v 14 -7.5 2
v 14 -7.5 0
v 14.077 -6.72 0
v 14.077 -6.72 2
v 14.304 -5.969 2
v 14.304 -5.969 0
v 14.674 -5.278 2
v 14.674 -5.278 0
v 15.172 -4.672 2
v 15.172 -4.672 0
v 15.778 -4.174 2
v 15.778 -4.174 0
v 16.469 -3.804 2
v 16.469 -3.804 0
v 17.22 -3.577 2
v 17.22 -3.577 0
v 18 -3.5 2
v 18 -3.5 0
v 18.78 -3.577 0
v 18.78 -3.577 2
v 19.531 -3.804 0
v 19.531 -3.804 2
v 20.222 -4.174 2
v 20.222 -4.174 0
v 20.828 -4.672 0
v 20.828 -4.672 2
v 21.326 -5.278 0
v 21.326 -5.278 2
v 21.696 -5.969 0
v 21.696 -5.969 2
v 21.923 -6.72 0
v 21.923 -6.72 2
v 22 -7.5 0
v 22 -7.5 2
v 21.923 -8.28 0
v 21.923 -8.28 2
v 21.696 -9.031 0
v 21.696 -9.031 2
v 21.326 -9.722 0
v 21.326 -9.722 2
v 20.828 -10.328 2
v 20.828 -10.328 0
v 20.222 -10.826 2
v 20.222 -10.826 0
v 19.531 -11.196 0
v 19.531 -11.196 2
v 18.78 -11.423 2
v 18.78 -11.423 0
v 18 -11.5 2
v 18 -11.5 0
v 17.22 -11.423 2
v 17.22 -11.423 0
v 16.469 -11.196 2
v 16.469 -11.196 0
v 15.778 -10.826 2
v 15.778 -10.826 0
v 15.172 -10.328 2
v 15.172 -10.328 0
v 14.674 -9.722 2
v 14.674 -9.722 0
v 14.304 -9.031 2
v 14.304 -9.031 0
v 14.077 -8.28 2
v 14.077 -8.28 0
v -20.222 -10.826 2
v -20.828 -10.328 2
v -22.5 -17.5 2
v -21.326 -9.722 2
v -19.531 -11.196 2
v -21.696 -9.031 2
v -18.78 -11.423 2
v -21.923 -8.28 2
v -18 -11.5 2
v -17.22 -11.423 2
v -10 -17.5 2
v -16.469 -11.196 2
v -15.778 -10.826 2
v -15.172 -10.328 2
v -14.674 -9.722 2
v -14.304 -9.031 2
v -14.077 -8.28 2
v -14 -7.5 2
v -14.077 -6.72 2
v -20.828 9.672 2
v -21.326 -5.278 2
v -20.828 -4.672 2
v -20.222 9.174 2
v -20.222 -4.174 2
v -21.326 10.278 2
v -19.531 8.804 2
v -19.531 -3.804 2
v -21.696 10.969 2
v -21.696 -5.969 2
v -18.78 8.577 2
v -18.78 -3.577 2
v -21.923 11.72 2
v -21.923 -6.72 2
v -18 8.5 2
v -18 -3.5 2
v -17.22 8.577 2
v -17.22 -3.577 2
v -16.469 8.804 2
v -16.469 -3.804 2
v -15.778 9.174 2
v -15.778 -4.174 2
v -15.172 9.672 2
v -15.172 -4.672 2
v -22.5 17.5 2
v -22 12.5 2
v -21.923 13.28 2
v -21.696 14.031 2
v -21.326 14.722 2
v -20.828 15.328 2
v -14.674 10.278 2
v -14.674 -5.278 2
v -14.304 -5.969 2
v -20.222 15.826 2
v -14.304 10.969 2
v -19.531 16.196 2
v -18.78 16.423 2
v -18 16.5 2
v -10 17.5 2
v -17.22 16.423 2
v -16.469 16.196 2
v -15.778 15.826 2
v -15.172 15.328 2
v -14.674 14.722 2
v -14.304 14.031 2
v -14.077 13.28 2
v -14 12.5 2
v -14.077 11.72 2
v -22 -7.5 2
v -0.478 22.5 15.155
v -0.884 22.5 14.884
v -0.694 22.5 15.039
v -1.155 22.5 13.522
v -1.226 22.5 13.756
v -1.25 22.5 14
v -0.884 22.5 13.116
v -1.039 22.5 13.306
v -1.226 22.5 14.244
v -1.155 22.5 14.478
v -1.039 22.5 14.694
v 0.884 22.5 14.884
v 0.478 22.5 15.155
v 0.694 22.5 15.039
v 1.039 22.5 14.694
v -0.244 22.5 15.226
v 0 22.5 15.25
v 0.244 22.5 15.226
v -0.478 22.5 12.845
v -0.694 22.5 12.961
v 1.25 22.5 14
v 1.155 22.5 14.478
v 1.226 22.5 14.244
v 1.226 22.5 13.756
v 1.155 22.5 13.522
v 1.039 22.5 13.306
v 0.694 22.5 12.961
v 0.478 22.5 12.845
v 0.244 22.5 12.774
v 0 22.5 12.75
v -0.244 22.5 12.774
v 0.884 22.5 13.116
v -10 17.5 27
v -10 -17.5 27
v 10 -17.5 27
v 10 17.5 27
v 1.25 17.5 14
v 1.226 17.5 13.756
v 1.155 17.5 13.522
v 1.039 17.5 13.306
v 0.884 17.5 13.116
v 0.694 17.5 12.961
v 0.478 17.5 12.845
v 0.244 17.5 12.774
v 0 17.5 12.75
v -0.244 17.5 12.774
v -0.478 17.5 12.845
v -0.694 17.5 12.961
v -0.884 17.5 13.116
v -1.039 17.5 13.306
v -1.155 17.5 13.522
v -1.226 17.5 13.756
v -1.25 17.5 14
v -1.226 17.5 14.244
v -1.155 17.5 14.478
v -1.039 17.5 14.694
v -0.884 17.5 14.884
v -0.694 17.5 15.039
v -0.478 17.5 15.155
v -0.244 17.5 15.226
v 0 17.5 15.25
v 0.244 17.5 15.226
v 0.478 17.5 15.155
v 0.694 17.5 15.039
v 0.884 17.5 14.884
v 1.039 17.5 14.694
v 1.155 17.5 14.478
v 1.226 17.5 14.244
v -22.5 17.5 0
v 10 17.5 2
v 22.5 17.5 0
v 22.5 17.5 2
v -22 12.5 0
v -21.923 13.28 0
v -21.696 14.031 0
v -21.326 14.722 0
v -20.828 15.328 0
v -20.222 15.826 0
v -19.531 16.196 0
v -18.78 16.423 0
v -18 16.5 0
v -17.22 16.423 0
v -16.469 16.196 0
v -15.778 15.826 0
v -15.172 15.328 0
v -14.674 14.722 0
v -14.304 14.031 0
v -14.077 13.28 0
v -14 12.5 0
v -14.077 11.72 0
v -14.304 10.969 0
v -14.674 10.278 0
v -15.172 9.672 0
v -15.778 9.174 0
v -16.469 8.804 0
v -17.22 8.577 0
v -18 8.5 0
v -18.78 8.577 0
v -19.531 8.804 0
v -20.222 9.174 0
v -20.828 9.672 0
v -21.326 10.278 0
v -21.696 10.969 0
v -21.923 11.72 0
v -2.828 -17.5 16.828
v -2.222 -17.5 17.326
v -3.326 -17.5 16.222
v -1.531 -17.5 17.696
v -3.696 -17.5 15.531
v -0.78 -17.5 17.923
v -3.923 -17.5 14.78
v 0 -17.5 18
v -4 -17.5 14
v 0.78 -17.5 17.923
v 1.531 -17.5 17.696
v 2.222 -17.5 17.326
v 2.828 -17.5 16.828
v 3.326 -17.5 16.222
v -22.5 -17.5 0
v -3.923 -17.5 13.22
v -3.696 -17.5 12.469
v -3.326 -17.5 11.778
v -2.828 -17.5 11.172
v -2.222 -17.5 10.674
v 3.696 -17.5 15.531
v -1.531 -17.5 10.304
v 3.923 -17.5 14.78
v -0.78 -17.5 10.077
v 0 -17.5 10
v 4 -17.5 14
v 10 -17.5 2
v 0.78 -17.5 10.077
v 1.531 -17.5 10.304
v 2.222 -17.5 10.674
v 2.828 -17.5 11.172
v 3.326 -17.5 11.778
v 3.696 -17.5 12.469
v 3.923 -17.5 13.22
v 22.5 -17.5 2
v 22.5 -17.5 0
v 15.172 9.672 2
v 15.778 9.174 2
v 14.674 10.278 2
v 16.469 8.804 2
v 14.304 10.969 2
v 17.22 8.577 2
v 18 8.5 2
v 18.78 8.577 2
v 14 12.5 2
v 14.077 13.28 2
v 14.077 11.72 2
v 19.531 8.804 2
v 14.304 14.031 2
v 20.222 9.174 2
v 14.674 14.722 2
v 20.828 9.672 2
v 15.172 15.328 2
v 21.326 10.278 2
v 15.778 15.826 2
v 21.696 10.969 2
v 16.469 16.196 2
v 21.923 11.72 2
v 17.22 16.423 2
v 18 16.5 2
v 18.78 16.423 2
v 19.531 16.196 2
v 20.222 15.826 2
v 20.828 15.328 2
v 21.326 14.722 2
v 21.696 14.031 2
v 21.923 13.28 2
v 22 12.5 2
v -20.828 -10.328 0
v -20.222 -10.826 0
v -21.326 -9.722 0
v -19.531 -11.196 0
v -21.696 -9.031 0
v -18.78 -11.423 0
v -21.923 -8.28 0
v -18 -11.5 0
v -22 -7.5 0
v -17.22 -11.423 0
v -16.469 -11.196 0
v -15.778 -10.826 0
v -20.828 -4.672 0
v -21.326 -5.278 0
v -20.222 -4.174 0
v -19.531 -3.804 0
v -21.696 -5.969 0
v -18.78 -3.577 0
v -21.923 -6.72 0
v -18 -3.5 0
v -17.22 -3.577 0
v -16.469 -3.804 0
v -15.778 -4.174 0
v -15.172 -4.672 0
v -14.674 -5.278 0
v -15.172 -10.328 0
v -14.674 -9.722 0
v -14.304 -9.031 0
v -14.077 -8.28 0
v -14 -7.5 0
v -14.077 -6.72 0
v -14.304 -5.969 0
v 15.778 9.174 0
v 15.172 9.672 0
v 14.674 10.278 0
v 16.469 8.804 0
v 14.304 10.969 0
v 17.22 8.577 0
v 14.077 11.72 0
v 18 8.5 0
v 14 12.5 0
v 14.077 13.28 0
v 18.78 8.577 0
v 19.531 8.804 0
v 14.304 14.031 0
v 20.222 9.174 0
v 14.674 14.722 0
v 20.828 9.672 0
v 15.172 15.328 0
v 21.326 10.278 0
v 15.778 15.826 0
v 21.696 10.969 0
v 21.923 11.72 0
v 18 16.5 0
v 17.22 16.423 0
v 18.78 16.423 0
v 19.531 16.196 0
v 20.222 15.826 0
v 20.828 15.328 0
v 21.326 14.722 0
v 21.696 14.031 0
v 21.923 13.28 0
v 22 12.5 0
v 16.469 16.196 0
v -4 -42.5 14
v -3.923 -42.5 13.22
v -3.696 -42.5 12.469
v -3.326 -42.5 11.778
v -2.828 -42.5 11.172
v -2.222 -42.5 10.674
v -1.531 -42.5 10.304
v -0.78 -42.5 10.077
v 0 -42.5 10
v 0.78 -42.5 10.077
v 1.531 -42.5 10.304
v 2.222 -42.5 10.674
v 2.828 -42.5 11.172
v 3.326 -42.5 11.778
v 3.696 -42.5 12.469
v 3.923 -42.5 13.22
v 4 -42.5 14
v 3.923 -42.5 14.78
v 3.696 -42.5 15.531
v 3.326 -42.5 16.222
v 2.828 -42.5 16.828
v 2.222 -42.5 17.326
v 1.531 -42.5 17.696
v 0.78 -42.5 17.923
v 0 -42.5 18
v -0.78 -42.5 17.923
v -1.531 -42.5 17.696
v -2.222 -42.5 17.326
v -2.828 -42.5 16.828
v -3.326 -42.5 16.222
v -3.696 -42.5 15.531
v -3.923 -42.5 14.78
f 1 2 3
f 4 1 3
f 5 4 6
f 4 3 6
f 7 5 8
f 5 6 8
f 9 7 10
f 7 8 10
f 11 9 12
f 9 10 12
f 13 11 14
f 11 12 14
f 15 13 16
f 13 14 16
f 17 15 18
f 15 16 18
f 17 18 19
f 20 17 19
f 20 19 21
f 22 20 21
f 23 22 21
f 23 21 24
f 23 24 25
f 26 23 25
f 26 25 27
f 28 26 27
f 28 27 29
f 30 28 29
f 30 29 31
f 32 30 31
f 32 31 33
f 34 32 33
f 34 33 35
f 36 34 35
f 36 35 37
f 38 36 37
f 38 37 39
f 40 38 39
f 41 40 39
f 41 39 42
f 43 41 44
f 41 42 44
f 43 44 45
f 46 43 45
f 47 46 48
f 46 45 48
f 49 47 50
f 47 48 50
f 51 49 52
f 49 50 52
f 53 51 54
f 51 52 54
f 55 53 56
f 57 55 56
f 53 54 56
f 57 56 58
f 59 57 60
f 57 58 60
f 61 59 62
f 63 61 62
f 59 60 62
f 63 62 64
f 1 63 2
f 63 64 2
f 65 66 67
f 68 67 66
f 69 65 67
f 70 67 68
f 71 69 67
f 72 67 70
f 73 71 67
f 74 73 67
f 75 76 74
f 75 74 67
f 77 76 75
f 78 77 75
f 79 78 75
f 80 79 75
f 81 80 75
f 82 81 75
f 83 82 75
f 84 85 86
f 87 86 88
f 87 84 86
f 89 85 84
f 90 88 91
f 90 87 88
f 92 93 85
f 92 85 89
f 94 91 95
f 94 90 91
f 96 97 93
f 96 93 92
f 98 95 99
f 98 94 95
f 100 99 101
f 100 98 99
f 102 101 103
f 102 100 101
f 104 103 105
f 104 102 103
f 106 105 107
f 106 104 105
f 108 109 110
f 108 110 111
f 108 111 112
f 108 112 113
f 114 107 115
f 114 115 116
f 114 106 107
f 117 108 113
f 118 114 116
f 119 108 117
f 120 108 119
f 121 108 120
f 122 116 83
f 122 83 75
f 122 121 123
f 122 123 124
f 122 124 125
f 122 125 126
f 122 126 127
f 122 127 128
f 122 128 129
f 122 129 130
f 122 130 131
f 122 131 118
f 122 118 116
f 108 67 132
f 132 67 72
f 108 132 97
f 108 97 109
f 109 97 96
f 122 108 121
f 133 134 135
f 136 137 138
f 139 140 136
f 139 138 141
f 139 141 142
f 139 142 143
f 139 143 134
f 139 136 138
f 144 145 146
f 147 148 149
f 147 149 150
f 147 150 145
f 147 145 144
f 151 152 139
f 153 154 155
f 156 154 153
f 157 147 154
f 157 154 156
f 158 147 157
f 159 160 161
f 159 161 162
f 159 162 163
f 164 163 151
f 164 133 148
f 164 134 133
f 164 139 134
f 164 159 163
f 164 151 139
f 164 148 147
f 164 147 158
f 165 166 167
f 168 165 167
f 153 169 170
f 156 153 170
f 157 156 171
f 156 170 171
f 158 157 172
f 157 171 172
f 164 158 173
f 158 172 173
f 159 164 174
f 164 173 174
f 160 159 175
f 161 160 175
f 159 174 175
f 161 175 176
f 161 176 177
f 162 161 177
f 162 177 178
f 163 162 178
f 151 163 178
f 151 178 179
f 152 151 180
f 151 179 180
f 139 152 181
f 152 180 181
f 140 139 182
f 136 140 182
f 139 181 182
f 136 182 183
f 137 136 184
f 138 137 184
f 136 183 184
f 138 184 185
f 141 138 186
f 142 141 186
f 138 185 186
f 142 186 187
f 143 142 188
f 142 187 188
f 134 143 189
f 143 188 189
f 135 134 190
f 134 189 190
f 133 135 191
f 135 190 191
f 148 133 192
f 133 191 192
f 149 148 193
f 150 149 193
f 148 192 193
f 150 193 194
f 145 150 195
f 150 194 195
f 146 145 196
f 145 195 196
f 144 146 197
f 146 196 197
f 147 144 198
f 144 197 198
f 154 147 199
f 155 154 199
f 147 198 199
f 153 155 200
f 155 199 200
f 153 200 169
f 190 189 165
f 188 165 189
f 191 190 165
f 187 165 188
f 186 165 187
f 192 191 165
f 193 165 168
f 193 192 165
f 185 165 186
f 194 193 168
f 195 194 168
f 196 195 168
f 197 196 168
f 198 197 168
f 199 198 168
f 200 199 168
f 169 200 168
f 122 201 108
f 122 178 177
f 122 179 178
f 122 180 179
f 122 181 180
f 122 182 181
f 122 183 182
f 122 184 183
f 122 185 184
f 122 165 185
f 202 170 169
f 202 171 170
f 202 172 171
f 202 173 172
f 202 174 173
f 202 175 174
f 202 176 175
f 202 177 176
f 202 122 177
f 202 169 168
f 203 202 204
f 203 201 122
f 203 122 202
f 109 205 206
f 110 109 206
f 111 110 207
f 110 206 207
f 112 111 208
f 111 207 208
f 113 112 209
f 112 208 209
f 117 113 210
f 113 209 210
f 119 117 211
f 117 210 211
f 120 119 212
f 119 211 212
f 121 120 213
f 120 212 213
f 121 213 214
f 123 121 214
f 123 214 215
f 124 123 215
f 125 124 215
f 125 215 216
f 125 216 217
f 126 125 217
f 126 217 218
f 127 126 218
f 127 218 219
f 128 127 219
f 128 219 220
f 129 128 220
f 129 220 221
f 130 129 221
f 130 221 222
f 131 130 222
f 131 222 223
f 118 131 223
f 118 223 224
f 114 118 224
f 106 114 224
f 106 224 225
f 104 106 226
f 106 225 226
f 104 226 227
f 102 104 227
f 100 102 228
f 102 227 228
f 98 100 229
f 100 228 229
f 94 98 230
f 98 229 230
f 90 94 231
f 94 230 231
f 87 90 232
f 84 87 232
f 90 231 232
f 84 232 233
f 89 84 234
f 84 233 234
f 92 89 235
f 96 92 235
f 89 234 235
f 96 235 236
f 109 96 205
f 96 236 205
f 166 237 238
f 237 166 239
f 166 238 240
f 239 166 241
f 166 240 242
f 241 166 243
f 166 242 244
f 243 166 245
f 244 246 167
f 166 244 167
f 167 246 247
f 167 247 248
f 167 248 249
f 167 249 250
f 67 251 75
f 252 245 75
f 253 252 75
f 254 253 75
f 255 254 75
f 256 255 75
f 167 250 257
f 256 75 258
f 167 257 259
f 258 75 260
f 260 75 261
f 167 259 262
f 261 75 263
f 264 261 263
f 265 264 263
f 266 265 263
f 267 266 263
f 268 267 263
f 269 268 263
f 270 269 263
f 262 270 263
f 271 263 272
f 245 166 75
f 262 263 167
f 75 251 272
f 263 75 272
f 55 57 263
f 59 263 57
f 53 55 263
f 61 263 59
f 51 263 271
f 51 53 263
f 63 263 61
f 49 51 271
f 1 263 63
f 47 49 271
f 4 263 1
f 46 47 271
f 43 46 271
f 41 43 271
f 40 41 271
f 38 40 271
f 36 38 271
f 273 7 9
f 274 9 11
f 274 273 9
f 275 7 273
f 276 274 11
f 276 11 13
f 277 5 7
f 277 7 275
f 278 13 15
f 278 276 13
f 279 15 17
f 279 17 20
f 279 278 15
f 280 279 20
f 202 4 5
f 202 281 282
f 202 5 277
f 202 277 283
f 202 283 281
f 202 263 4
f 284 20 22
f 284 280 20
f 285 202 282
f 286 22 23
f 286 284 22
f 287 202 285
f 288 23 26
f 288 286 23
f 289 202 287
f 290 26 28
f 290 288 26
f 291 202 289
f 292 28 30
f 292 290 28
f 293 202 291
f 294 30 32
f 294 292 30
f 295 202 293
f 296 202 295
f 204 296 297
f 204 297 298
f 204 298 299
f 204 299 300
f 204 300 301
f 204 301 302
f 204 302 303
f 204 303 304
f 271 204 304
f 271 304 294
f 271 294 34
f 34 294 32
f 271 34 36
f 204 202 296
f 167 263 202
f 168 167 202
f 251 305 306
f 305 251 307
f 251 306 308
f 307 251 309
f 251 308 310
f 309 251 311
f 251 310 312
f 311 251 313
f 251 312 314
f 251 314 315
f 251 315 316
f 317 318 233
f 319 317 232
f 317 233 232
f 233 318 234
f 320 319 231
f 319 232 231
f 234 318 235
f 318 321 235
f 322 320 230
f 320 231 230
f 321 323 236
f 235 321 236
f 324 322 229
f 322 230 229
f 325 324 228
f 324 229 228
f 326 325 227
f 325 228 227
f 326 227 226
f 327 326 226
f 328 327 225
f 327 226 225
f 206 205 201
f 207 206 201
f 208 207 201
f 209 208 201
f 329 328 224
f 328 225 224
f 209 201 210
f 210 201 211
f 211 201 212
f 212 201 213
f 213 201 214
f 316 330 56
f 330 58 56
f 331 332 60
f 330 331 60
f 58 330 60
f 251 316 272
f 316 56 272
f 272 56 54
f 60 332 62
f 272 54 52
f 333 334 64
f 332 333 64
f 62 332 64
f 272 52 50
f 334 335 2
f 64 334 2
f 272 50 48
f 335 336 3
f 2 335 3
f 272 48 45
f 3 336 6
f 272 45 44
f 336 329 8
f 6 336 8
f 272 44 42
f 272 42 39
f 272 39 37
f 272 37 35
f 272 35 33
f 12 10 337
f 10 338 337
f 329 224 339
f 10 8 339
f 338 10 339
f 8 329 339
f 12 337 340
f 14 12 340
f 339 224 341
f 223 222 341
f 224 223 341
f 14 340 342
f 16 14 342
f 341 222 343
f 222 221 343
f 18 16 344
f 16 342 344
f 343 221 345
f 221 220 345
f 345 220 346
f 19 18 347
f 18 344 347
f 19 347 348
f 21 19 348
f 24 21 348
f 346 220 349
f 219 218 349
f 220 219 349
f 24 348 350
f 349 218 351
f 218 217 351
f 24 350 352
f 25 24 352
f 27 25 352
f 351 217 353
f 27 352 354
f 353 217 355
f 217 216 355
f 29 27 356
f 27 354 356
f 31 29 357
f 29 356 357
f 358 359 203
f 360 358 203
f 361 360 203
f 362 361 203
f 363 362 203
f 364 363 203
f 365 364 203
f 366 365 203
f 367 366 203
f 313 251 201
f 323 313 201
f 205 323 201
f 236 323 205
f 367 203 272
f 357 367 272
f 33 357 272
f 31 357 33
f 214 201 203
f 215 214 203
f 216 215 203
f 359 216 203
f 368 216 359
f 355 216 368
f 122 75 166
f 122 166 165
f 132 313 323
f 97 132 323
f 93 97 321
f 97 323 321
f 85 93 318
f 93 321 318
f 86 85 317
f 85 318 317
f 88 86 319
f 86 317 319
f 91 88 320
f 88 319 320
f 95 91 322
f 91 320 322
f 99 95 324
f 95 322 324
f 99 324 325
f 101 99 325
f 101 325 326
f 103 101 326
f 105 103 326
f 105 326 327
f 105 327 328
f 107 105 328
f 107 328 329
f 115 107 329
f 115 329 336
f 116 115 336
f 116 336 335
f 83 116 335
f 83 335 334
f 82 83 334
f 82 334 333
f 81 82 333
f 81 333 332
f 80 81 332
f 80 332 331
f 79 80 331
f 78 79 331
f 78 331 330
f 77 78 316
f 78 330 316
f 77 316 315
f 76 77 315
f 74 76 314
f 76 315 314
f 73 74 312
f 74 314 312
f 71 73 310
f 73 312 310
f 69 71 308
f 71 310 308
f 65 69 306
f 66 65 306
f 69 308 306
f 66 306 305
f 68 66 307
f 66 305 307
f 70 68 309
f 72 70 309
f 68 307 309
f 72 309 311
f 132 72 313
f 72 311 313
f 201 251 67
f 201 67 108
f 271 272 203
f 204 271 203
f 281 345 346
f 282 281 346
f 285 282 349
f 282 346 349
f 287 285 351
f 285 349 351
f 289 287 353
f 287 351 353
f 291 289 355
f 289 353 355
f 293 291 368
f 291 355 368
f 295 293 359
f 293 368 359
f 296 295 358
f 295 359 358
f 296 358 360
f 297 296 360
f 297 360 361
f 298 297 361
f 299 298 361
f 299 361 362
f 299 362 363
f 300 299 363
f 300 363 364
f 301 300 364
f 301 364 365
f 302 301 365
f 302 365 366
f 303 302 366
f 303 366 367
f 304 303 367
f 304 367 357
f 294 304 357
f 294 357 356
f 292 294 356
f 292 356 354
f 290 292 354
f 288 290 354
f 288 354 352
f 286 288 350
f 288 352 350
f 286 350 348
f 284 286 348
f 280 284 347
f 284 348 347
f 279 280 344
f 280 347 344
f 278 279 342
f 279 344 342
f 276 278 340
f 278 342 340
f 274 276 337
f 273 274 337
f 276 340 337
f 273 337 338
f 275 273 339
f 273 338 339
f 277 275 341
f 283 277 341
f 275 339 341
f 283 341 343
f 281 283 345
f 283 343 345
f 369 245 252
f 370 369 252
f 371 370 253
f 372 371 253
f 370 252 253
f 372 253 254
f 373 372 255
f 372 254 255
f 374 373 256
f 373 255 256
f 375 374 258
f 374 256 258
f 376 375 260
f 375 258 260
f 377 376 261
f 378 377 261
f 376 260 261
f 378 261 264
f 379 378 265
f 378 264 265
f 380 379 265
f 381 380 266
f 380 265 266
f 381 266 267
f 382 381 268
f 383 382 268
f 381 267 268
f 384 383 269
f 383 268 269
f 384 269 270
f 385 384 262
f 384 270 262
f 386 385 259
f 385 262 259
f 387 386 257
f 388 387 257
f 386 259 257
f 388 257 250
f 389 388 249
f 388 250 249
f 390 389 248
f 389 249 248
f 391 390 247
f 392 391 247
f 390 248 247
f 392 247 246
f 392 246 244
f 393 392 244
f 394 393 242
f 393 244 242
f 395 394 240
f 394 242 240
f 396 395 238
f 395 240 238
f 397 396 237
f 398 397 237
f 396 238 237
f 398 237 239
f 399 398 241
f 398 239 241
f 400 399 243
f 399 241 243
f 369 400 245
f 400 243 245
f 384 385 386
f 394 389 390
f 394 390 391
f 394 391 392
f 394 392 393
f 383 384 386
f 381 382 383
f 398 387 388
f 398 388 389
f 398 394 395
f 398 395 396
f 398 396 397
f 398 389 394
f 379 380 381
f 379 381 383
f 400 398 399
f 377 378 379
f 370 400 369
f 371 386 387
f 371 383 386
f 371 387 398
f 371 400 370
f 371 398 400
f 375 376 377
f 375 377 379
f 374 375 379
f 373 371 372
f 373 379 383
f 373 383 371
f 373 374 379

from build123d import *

# Parameters (mm, degrees)
SKETCH_1_W          = 45
SKETCH_1_H          = 35
EXTRUDE_1_DEPTH     = 2
SKETCH_2_W          = 20
SKETCH_2_H          = 35
EXTRUDE_2_DEPTH     = 25
SKETCH_3_R          = 4
EXTRUDE_3_DEPTH     = 25
SKETCH_4_R          = 1.25
EXTRUDE_4_DEPTH     = 5
SKETCH_5_R          = 4
CUT_EXTRUDE_1_DEPTH = 28


with BuildPart() as part:
    # ｽｹｯﾁ1 → ﾎﾞｽ - 押し出し1 (new body)
    with BuildSketch(Plane.XY):
        Rectangle(SKETCH_1_W, SKETCH_1_H)
    extrude(amount=EXTRUDE_1_DEPTH)

    # ｽｹｯﾁ2 → ﾎﾞｽ - 押し出し2 (add)
    with BuildSketch(Plane.XY.offset(2)):
        Rectangle(SKETCH_2_W, SKETCH_2_H)
    extrude(amount=EXTRUDE_2_DEPTH)

    # ｽｹｯﾁ3 → ﾎﾞｽ - 押し出し3 (add)
    with BuildSketch(Plane(origin=(0, -17.5, 0), x_dir=(-1, 0, 0), z_dir=(0, -1, 0))):
        with Locations((0, -14)):
            Circle(SKETCH_3_R)
    extrude(amount=EXTRUDE_3_DEPTH)

    # ｽｹｯﾁ4 → ﾎﾞｽ - 押し出し4 (add)
    with BuildSketch(Plane(origin=(0, 17.5, 0), x_dir=(1, 0, 0), z_dir=(0, 1, 0))):
        with Locations((0, -14)):
            Circle(SKETCH_4_R)
    extrude(amount=EXTRUDE_4_DEPTH)

    # ｽｹｯﾁ5 → ｶｯﾄ - 押し出し1 (cut, through all)
    with BuildSketch(Plane(origin=(0, 0, 0), x_dir=(-1, 0, 0), z_dir=(0, 0, -1))):
        with Locations((18, -7.5)):
            Circle(SKETCH_5_R)
        with Locations((18, 12.5)):
            Circle(SKETCH_5_R)
        with Locations((-18, 12.5)):
            Circle(SKETCH_5_R)
        with Locations((-18, -7.5)):
            Circle(SKETCH_5_R)
    extrude(amount=-CUT_EXTRUDE_1_DEPTH, mode=Mode.SUBTRACT)


solid = part.part
